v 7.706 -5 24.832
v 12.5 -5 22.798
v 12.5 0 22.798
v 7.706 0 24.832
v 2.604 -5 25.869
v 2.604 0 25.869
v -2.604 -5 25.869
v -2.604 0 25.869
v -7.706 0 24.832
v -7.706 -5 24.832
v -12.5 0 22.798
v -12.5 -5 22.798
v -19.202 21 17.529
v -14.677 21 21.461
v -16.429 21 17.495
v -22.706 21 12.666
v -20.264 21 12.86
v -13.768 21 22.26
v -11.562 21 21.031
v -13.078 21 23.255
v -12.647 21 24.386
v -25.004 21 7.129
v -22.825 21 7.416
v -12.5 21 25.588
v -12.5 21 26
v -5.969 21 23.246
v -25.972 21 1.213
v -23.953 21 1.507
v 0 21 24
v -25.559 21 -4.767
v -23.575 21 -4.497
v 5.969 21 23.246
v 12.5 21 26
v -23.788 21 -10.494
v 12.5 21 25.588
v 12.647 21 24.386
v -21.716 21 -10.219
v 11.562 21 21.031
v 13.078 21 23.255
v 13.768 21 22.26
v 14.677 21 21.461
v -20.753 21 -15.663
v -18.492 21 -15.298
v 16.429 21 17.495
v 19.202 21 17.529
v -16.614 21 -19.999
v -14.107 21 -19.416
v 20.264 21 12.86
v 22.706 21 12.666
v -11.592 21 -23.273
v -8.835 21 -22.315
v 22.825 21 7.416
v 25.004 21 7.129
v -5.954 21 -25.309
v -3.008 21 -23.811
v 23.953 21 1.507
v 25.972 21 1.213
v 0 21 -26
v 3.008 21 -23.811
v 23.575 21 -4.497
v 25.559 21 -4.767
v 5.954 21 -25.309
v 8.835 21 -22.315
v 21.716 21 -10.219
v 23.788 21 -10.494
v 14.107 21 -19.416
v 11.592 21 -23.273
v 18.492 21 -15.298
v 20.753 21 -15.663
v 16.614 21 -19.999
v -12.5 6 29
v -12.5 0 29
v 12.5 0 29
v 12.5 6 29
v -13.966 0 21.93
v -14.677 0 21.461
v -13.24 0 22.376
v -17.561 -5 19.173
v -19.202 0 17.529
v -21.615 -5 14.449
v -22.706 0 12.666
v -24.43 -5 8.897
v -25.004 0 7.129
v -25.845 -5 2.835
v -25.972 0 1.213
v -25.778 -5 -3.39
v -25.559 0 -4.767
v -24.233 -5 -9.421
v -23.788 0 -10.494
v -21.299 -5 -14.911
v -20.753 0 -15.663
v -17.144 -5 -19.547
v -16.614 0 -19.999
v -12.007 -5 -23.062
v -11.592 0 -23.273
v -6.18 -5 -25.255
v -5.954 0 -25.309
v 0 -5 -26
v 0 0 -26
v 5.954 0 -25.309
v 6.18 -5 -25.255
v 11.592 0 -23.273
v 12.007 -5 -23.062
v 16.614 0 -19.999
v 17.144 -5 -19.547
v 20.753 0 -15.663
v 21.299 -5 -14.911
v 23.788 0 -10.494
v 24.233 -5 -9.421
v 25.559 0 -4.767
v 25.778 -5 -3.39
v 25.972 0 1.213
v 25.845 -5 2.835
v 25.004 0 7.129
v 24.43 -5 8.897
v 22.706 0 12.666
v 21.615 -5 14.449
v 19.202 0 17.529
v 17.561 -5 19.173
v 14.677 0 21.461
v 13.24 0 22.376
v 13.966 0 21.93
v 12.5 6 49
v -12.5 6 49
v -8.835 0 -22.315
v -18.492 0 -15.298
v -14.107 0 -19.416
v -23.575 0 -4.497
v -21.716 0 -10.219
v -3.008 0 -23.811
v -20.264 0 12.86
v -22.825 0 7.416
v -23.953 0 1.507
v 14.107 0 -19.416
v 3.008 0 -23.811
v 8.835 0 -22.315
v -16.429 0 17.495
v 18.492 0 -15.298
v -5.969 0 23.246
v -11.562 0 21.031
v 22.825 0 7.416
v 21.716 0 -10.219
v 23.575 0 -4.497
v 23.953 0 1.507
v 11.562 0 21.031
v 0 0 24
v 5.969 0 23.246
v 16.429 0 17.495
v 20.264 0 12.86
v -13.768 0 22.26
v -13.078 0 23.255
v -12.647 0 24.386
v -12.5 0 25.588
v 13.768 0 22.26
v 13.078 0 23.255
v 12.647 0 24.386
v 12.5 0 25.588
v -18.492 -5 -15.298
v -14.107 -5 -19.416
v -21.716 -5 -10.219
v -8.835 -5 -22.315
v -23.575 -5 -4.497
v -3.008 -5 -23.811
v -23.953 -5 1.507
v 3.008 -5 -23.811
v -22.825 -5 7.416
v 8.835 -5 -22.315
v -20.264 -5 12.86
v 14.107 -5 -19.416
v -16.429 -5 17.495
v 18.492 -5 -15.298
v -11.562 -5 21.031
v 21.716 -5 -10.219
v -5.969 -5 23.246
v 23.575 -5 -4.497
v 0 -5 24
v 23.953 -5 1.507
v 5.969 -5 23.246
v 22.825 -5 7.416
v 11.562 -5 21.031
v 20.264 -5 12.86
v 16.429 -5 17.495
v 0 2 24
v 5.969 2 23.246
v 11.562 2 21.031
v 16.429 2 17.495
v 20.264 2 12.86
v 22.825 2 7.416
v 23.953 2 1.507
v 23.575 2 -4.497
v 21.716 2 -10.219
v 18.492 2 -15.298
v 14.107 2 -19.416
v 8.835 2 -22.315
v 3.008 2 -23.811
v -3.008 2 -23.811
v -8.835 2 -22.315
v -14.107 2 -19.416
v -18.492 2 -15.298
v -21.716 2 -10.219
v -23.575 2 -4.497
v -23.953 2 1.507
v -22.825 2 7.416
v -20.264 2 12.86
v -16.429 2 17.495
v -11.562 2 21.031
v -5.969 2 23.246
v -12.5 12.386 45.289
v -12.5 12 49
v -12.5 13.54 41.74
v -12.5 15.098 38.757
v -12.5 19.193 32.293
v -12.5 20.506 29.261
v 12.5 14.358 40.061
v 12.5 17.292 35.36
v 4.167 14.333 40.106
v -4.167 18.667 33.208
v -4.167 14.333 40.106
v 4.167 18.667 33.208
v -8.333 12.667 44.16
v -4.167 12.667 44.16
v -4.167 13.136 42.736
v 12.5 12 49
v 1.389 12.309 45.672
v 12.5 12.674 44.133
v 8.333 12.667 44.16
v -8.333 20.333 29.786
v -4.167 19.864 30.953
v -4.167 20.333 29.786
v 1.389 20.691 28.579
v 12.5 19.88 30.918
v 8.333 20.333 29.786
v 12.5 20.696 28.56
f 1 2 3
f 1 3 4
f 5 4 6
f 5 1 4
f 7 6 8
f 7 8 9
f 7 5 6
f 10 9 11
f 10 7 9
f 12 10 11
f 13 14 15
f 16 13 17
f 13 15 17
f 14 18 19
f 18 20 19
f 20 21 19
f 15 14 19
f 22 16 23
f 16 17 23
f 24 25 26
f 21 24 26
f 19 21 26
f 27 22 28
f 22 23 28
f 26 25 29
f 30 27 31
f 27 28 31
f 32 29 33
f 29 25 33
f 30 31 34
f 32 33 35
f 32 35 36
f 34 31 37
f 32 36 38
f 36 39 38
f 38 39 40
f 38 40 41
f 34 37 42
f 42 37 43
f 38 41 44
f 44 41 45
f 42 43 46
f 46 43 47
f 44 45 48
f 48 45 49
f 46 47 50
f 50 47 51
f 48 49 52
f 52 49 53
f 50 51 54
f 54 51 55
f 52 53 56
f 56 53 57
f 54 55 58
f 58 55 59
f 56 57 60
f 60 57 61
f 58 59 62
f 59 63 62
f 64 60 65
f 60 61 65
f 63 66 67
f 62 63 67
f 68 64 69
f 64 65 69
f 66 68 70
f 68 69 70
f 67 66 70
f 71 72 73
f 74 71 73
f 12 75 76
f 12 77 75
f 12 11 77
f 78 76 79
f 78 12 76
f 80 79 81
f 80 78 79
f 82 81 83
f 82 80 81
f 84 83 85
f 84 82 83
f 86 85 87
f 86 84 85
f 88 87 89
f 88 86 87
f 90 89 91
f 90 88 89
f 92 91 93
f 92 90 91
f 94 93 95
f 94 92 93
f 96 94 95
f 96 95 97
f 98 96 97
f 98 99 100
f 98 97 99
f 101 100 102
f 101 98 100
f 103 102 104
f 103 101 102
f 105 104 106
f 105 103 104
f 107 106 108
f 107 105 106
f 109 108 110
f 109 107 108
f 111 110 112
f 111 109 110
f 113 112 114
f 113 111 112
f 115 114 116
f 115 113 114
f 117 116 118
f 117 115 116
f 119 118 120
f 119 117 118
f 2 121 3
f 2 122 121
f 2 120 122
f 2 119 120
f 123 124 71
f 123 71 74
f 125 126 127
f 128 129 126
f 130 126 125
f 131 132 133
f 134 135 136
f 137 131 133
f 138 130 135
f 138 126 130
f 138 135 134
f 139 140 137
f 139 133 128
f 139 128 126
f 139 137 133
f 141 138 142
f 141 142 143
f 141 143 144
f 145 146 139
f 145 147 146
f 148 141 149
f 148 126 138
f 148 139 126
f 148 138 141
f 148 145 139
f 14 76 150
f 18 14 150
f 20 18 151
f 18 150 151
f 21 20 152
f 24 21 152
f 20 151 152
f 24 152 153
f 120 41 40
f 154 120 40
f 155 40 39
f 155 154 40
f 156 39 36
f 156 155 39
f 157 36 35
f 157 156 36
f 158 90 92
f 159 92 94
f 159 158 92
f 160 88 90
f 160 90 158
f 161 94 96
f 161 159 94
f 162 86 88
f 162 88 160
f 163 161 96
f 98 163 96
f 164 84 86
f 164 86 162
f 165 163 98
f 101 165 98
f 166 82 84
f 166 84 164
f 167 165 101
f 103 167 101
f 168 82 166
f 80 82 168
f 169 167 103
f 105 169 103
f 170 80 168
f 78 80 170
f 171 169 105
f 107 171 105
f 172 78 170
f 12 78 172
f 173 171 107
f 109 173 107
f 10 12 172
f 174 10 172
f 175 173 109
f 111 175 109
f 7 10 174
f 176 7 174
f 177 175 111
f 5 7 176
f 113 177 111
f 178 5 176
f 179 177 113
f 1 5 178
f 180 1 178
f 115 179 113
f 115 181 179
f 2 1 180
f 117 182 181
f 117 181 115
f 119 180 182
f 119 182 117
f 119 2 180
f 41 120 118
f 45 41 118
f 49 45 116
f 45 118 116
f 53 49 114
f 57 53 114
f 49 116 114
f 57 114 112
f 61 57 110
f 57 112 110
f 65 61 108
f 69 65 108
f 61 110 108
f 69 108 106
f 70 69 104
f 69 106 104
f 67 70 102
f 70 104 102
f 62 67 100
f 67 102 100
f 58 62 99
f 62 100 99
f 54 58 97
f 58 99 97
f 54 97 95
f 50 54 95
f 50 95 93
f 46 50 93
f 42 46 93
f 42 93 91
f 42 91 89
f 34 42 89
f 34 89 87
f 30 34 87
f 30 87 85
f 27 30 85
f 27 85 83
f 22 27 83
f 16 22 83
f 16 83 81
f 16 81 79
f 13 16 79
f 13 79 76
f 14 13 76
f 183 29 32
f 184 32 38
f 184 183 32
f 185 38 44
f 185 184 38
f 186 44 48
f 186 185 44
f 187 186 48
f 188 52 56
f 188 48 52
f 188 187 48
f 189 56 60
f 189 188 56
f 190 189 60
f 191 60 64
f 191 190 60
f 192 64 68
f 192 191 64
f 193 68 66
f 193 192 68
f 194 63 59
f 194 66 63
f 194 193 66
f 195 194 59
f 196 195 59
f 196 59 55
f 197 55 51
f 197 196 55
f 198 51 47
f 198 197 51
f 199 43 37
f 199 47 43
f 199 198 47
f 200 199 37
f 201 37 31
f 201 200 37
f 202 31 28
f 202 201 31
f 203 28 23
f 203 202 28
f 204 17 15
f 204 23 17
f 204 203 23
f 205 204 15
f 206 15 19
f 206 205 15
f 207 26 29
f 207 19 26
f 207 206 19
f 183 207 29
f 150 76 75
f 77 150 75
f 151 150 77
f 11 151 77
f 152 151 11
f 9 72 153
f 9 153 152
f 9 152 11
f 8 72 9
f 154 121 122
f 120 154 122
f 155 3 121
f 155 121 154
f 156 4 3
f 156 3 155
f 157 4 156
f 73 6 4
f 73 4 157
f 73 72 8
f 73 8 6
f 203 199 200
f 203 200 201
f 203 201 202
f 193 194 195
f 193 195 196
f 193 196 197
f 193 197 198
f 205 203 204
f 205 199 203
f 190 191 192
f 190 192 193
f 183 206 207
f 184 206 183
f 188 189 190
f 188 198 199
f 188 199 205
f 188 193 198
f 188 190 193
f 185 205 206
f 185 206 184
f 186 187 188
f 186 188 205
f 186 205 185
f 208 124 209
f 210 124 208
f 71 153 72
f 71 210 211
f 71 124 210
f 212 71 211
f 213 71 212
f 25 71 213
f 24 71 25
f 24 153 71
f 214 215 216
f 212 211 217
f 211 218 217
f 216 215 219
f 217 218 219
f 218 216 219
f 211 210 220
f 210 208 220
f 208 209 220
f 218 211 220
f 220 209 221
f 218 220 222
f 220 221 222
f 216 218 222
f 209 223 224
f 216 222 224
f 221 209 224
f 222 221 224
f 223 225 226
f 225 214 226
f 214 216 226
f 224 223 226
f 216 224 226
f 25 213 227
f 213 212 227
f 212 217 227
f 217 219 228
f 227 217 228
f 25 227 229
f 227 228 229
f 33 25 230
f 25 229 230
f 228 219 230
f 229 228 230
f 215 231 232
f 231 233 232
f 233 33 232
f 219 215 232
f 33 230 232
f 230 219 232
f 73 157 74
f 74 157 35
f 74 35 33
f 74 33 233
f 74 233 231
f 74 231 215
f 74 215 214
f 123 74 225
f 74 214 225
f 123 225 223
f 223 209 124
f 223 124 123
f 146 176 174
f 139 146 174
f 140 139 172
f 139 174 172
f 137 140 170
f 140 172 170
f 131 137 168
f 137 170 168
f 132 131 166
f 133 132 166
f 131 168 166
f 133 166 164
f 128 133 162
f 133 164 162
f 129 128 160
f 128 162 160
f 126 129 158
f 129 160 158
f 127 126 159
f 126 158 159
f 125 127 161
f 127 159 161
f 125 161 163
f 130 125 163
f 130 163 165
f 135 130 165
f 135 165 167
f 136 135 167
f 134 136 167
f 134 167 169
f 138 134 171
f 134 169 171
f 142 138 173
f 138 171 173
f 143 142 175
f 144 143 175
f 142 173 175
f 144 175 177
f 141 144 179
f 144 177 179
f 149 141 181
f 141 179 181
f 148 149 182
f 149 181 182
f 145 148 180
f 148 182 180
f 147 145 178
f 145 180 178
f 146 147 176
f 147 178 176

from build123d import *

# Parameters (mm, degrees)
SKETCH_1_R           = 26
EXTRUDE_1_DEPTH      = 2
SKETCH_2_R           = 26
SKETCH_2_R_2         = 24
EXTRUDE_2_DEPTH      = 19
EXTRUDE_3_REACH      = 84.11
EXTRUDE_3_END_RADIUS = 26
SKETCH_4_W           = 25
SKETCH_4_H           = 12
SKETCH_5_W           = 25
SKETCH_5_H           = 20
CUT_EXTRUDE_1_DEPTH  = 6
EXTRUDE_5_REACH      = 67.759
CUT_EXTRUDE_START    = -19
SKETCH_7_R           = 24
CUT_EXTRUDE_2_DEPTH  = 19
EXTRUDE_START        = 5
SKETCH_8_R           = 24
EXTRUDE_6_DEPTH      = 5
FILLET_1_R           = 5


with BuildPart() as part:
    # Эскиз1 → Бобышка-Вытянуть1 (new body)
    with BuildSketch(Plane(origin=(0, 0, 0), x_dir=(1, 0, 0), z_dir=(0, 1, 0))):
        with Locations(Location((0, 0, 0), (0, 0, 270))):
            Circle(SKETCH_1_R)
    extrude(amount=EXTRUDE_1_DEPTH)

    # Эскиз2 → Бобышка-Вытянуть2 (add)
    with BuildSketch(Plane(origin=(0, 2, 0), x_dir=(1, 0, 0), z_dir=(0, 1, 0))):
        with Locations(Location((0, 0, 0), (0, 0, 270))):
            Circle(SKETCH_2_R)
        with Locations(Location((0, 0, 0), (0, 0, 270))):
            Circle(SKETCH_2_R_2, mode=Mode.SUBTRACT)
    extrude(amount=EXTRUDE_2_DEPTH)

    # Бобышка-Вытянуть3: up to this cylinder (the profile starts outside it)
    extrude_3_end = Plane(origin=(0, 6, 0), z_dir=(0, -1, 0)) * Cylinder(EXTRUDE_3_END_RADIUS, 221.22, mode=Mode.PRIVATE)
    # Эскиз4 → Бобышка-Вытянуть3 (add, up to the surface)
    with BuildSketch(Plane.XY.offset(49), mode=Mode.PRIVATE) as extrude_3_sk1:
        with Locations((0, 6)):
            Rectangle(SKETCH_4_W, SKETCH_4_H)
    extrude_3_tool1 = extrude(extrude_3_sk1.sketch, amount=-EXTRUDE_3_REACH, mode=Mode.PRIVATE) - extrude_3_end
    add(extrude_3_tool1.solids().sort_by_distance((0, 6, 49))[0])

    # Эскиз5 → Вырез-Вытянуть1 (cut)
    with BuildSketch(Plane.XZ):
        with Locations((0, 39)):
            Rectangle(SKETCH_5_W, SKETCH_5_H)
    extrude(amount=-CUT_EXTRUDE_1_DEPTH, mode=Mode.SUBTRACT)

    # Бобышка-Вытянуть5: up to this face of the body (flat: up to its plane)
    extrude_5_end = Plane(part.part.faces().sort_by_distance((-12.5, 7.851626254, 33.985056872))[0])
    # Эскиз6 → Бобышка-Вытянуть5 (add, up to the picked face)
    with BuildSketch(Plane(origin=(12.5, 0, 0), x_dir=(0, 0, -1), z_dir=(1, 0, 0)), mode=Mode.PRIVATE) as extrude_5_sk1:
        with BuildLine():
            Line((-26, 21), (-22.79802623, 21))
            Line((-22.79802623, 21), (-22.79802623, 12))
            Line((-22.79802623, 12), (-49, 12))
            add(Edge.make_bspline(
                [(-49, 12), (-38.341292939, 12), (-34.129850558, 21), (-26, 21)],
                knots=[0, 0, 0, 0, 1, 1, 1, 1], degree=3))
        make_face()
    extrude_5_tool1 = split(extrude(extrude_5_sk1.sketch, amount=-EXTRUDE_5_REACH, mode=Mode.PRIVATE), bisect_by=extrude_5_end, keep=Keep.BOTH, mode=Mode.PRIVATE)
    add(extrude_5_tool1.solids().sort_by(Axis((12.5, 15.609347, 30.602096), (-1, 0, 0)))[0])

    # Эскиз7 → Вырез-Вытянуть2 (cut)
    with BuildSketch(Plane(origin=(0, 21, 0), x_dir=(1, 0, 0), z_dir=(0, 1, 0)).offset(CUT_EXTRUDE_START)):
        with Locations(Location((0, 0, 0), (0, 0, 270))):
            Circle(SKETCH_7_R)
    extrude(amount=CUT_EXTRUDE_2_DEPTH, mode=Mode.SUBTRACT)

    # Эскиз8 → Бобышка-Вытянуть6 (add)
    with BuildSketch(Plane.XZ.offset(EXTRUDE_START)):
        with BuildLine():
            ThreePointArc((-12.5, 22.79802623), (0, -26), (12.5, 22.79802623))
            ThreePointArc((12.5, 22.79802623), (0, 26), (-12.5, 22.79802623))
        make_face()
        with Locations(Location((0, 0, 0), (0, 0, 90))):
            Circle(SKETCH_8_R, mode=Mode.SUBTRACT)
    extrude(amount=-EXTRUDE_6_DEPTH)

    # Скругление1
    fillet_1_edges = [part.edges().sort_by_distance(p)[0] for p in [
        (12.5, 10.5, 22.79802623),
        (-12.5, 10.5, 22.79802623),
    ]]
    fillet(fillet_1_edges, radius=FILLET_1_R)


solid = part.part
